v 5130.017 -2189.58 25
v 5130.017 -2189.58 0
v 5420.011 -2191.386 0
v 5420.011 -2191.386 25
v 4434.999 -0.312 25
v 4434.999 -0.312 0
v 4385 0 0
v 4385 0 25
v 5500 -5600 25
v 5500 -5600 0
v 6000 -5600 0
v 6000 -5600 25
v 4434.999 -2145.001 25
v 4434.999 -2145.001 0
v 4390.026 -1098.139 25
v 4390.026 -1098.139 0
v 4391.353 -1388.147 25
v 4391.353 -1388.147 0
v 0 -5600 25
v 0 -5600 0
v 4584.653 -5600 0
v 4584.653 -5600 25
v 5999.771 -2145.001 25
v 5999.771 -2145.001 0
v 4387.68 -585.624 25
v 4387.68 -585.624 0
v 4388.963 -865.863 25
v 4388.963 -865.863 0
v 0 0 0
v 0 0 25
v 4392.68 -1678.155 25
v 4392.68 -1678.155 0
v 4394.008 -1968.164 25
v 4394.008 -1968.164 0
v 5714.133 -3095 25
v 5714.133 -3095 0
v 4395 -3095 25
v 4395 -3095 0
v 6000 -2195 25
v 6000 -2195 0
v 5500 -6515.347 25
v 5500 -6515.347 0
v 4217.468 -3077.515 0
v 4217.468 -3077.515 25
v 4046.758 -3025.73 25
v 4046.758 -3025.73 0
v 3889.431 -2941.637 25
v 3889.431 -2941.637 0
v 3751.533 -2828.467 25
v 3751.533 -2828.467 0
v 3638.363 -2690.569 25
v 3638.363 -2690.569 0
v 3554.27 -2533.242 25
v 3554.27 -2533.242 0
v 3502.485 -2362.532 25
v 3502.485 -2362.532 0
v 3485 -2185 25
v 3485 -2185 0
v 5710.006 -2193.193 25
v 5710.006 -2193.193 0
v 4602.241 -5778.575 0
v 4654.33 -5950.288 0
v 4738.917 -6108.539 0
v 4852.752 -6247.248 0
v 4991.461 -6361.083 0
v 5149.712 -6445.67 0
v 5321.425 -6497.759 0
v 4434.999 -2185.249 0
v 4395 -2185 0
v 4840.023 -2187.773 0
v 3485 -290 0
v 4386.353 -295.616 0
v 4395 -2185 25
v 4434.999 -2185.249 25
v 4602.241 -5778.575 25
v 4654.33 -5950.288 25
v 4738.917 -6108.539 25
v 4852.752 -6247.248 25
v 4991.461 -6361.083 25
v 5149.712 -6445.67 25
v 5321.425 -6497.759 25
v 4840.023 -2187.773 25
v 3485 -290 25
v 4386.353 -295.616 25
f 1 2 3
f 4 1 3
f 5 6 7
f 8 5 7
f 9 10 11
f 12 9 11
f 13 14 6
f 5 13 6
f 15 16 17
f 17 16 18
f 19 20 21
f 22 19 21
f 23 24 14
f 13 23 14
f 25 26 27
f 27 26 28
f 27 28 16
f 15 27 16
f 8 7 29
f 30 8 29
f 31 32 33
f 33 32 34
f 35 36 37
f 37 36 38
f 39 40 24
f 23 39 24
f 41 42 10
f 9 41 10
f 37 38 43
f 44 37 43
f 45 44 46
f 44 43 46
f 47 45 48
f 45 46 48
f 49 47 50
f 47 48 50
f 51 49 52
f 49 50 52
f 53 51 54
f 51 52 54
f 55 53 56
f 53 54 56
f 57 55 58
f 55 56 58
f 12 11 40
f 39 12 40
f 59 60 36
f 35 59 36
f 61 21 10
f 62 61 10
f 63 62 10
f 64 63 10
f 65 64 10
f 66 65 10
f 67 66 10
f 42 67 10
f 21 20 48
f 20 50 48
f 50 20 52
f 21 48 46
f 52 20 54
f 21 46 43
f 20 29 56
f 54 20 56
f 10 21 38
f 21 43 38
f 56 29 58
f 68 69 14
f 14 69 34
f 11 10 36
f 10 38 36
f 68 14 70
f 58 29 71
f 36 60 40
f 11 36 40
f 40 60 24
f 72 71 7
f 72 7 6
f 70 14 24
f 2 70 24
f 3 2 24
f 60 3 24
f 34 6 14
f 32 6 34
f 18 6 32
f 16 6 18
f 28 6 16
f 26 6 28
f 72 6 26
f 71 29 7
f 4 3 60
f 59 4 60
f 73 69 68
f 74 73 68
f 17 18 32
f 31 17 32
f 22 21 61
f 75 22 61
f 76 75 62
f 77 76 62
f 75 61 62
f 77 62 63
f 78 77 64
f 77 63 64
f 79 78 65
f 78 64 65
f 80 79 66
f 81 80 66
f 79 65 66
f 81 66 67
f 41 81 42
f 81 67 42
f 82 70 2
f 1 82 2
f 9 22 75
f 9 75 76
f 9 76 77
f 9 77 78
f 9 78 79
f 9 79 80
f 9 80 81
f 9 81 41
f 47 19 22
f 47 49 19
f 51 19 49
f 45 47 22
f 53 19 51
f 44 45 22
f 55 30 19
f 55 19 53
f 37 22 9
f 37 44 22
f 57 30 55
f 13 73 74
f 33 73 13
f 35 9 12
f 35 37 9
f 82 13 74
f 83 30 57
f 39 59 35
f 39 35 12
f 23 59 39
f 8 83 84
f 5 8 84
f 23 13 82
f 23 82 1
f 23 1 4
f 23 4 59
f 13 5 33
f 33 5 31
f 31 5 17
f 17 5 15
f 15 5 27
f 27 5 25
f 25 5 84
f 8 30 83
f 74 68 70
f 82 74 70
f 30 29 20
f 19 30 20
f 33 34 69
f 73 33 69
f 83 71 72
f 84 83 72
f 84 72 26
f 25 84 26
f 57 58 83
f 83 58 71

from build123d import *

# Parameters (mm, degrees)
F1_DEPTH = 25


with BuildPart() as f1:
    # F0 (on Top) → F1 (new body)
    with BuildSketch(Plane.XY):
        with BuildLine():
            Line((3485, 0), (0, 0))
            Line((0, 0), (0, -5600))
            Line((0, -5600), (4584.653106, -5600))
            ThreePointArc((4584.653106, -5600), (4852.752004, -6247.247996), (5500, -6515.346894))
            Line((5500, -6515.346894), (5500, -5600))
            Line((5500, -5600), (6000, -5600))
            Line((6000, -5600), (6000, -3095))
            Line((6000, -3095), (5714.132891, -3095))
            Line((5714.132891, -3095), (5424.146789, -3095))
            Line((5424.146789, -3095), (5134.160687, -3095))
            Line((5134.160687, -3095), (4840.022515, -3095))
            Line((4840.022515, -3095), (4395, -3095))
            ThreePointArc((4395, -3095), (3751.532829, -2828.467171), (3485, -2185))
            Line((3485, -2185), (3485, -1962.5))
            Line((3485, -1962.5), (3485, -1672.5))
            Line((3485, -1672.5), (3485, -1382.5))
            Line((3485, -1382.5), (3485, -1092.5))
            Line((3485, -1092.5), (3485, -870))
            Line((3485, -870), (3485, -580))
            Line((3485, -580), (3485, -290))
            Line((3485, -290), (3485, 0))
        make_face()
        Polygon((4385, 0), (3485, 0), (3485, -290), (4386.352933, -295.615906), align=None)
        Polygon((4434.99903, -0.31152), (4385, 0), (4386.352933, -295.615906), (4387.680202, -585.624176), (4388.962759, -865.862871), (4390.025807, -1098.13879), (4391.353076, -1388.14706), (4392.680345, -1678.155329), (4394.007614, -1968.163599), (4395, -2185), (4434.99903, -2185.249215), (4434.99903, -2145.000524), align=None)
        Polygon((5999.771169, -2145.000524), (4434.99903, -2145.000524), (4434.99903, -2185.249215), (4840.022515, -2187.772726), (5130.016886, -2189.579544), (5420.011257, -2191.386363), (5710.005629, -2193.193181), (6000, -2195), align=None)
        Polygon((5714.132891, -3095), (6000, -3095), (6000, -2195), (5710.005629, -2193.193181), align=None)
    extrude(amount=F1_DEPTH)


solid = f1.part
